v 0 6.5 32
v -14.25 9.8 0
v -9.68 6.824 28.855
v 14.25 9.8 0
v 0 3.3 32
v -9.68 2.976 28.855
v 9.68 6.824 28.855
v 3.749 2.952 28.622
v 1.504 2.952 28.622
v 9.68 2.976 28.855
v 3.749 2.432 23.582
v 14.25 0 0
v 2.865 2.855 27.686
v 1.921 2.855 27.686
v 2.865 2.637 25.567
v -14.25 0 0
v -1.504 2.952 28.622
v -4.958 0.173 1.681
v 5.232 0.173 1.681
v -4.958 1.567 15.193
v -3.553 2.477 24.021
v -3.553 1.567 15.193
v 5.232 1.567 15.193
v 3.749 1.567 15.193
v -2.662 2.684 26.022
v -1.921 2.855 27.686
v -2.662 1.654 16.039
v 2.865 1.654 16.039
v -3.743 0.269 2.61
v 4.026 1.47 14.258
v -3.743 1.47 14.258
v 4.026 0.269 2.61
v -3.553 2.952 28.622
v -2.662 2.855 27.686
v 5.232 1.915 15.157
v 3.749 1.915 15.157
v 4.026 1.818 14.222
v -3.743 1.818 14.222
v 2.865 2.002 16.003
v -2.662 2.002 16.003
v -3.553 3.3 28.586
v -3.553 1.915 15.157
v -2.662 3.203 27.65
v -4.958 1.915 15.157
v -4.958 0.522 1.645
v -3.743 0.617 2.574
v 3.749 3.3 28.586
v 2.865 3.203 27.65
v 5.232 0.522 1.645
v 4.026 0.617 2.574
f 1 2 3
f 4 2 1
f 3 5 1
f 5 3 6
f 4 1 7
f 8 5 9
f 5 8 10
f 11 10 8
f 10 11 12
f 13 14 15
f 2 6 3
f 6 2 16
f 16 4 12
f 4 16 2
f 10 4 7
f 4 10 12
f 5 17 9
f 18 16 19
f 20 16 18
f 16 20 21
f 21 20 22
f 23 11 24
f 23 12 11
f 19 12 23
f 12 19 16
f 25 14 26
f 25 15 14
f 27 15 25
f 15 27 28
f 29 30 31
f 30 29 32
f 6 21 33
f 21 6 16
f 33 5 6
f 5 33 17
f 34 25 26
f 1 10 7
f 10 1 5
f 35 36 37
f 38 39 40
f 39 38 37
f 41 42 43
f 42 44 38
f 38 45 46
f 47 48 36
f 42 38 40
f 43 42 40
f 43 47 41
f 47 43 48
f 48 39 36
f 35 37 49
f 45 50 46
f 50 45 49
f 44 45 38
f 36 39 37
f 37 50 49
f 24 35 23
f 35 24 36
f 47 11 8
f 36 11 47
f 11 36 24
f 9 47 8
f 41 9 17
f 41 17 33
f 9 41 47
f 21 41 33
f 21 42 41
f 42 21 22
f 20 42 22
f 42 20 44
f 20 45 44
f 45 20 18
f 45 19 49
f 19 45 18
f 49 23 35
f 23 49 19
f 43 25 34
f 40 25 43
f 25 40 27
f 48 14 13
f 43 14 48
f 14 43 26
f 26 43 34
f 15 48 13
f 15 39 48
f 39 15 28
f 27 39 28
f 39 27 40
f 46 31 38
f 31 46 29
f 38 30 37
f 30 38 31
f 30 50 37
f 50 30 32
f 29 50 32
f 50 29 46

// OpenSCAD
// SPDX-License-Identifier: MIT
// Copyright (c) 2026 KomaSCAD contributors. https://github.com/Kazutadashi/koma-scad
//
// KomaSCAD: a parametric shogi piece. Tested with OpenSCAD 2021.01.
// The default settings make the king of the bundled shogi set.
// Units are mm and degrees, before Model Scale, unless a comment says otherwise.
// Guides: README.md. Every setting: docs/parameters.md.
// Keep shogi_piece.json and move_diagrams.scad next to this file.

/* [01 - Start here] */
// A label for your own use. It does not change the piece.
Category = "King";
// Characters on the front, from the point to the heel.
Front_Characters = "王将";
// Characters on the back (the promoted side). Empty = blank back.
Back_Characters = "";
// An installed Japanese font. Find its exact name in Help > Font List.
Font_Name = "Yuji Syuku:style=Regular";
// Model shows the piece in its colors; press F6 for an STL. Use komascad.py export for a color 3MF.
Output_Mode = "Model"; // [Model,Blank,Inspect front,Inspect back,Inspect printability,Inspect signature,Inspect pawn circle]
// How the piece sits on the print bed. Raised text cannot touch the bed.
Print_Orientation = "Upright"; // [Upright,Front face down,Back face down]
// Multiplier for all lengths. 1 = the dimensions below.
Model_Scale = 1; // [0.25:0.05:20]

/* [02 - Piece dimensions] */
// mm. Length from the heel to the point.
Piece_Length = 32; // [15:0.1:100]
// mm. Width at the heel.
Base_Width = 28.5; // [10:0.1:100]
// mm. Thickness at the heel.
Rear_Thickness = 9.8; // [3:0.1:30]
// Tip thickness: set the thickness at the point. Reference side angles: set the slope of each face.
Taper_Mode = "Tip thickness"; // [Tip thickness,Reference side angles]
// mm. Thickness at the point, before the bevel.
Tip_Thickness = 3.2; // [1:0.1:20]

/* [03 - Front layout] */
// mm. Text size, not the measured glyph height. 0 = automatic.
Front_Font_Size = 10.4; // [0:0.1:40]
// Multiplier for the text size. 1.1 = 10% larger.
Front_Text_Scale = 1; // [0.25:0.01:2]
// mm. Distance between character centers. 0 = automatic.
Front_Character_Spacing = 10.5; // [0:0.1:40]
// Multiplier for the automatic spacing. It does not change the text size.
Front_Spacing_Scale = 1; // [0.5:0.01:2]
// Center of the text: 0 = heel, 1 = point. With Move Pitch above 0, the center of the characters only.
Front_Center_Fraction = 0.455; // [0:0.01:1]
// mm. Moves all the text. Positive = to the right.
Front_Text_X = 0; // [-20:0.1:20]
// mm. Moves all the text. Positive = toward the point.
Front_Text_Y = 0; // [-20:0.1:20]
// Multiplier for the glyph width. It does not change the spacing.
Front_Width_Scale = 1; // [0.25:0.01:2]
// Multiplier for the glyph height.
Front_Height_Scale = 1.06; // [0.25:0.01:2]
// Degrees, counterclockwise. Turns all the text around its center.
Front_Text_Rotation = 0; // [-180:1:180]

/* [04 - Back layout] */
// Use the front layout, text style, depth and stroke on the back. Back text and color stay separate.
Mirror_Front_Settings = false;
// mm. Text size, not the measured glyph height. 0 = automatic.
Back_Font_Size = 0; // [0:0.1:40]
// Multiplier for the text size. 1.1 = 10% larger.
Back_Text_Scale = 1; // [0.25:0.01:2]
// mm. Distance between character centers. 0 = automatic.
Back_Character_Spacing = 0; // [0:0.1:40]
// Multiplier for the automatic spacing. It does not change the text size.
Back_Spacing_Scale = 1; // [0.5:0.01:2]
// Center of the text: 0 = heel, 1 = point. With Move Pitch above 0, the center of the characters only.
Back_Center_Fraction = 0.42; // [0:0.01:1]
// mm. Moves all the text. Positive = to the right, seen from the back.
Back_Text_X = 0; // [-20:0.1:20]
// mm. Moves all the text. Positive = toward the point.
Back_Text_Y = 0; // [-20:0.1:20]
// Multiplier for the glyph width. It does not change the spacing.
Back_Width_Scale = 1; // [0.25:0.01:2]
// Multiplier for the glyph height.
Back_Height_Scale = 1; // [0.25:0.01:2]
// Degrees, counterclockwise. Turns all the text around its center.
Back_Text_Rotation = 0; // [-180:1:180]

/* [05 - Front character adjustments] */
// Multiplier for each character: [first, second, third], from the point. A diagram uses the entry of its slot.
Front_Glyph_Size = [1, 1, 1]; // [0.25:0.01:2]
// Multiplier for the width of each character.
Front_Glyph_Width = [1, 1.4, 1]; // [0.25:0.01:2]
// Multiplier for the height of each character.
Front_Glyph_Height = [1, 1, 1]; // [0.25:0.01:2]
// mm. Moves each character. Positive = to the right.
Front_Glyph_X = [0, 0, 0]; // [-10:0.1:10]
// mm. Moves each character. Positive = toward the point.
Front_Glyph_Y = [2, -1, 0]; // [-10:0.1:10]
// Degrees, counterclockwise. Turns each character.
Front_Glyph_Rotation = [0, 0, 0]; // [-180:1:180]

/* [06 - Back character adjustments] */
// Multiplier for each character: [first, second, third], from the point. A diagram uses the entry of its slot.
Back_Glyph_Size = [1, 1, 1]; // [0.25:0.01:2]
// Multiplier for the width of each character.
Back_Glyph_Width = [1, 1, 1]; // [0.25:0.01:2]
// Multiplier for the height of each character.
Back_Glyph_Height = [1, 1, 1]; // [0.25:0.01:2]
// mm. Moves each character. Positive = to the right, seen from the back.
Back_Glyph_X = [0, 0, 0]; // [-10:0.1:10]
// mm. Moves each character. Positive = toward the point.
Back_Glyph_Y = [1, 0, 0]; // [-10:0.1:10]
// Degrees, counterclockwise. Turns each character.
Back_Glyph_Rotation = [0, 0, 0]; // [-180:1:180]

/* [07 - Filament colors] */
// Body color. It becomes a named material in the color 3MF. Custom uses Body Color.
Body_Filament = "Wood"; // [Wood,Black,White,Red,Blue,Green,Purple,Yellow,Orange,Silver,Gold,Glitter silver,Glitter gold,Filament 1,Filament 2,Filament 3,Custom]
// Front text color.
Front_Filament = "Black"; // [Same as body,Wood,Black,White,Red,Blue,Green,Purple,Yellow,Orange,Silver,Gold,Glitter silver,Glitter gold,Filament 1,Filament 2,Filament 3,Custom]
// Back text color.
Back_Filament = "Red"; // [Same as body,Same as front,Wood,Black,White,Red,Blue,Green,Purple,Yellow,Orange,Silver,Gold,Glitter silver,Glitter gold,Filament 1,Filament 2,Filament 3,Custom]

/* [08 - Engraving and stroke weight] */
// Face only: color the groove floor. Painted grooves: floor and walls. Flush filled: fill the groove.
Text_Color_Treatment = "Flush filled"; // [Face only,Painted grooves,Flush filled]
// Recessed: cut into the face. Raised: stands up from the face. None: no text.
Front_Text_Style = "Recessed"; // [Recessed,Raised,None]
// Recessed: cut into the face. Raised: stands up from the face. None: no text.
Back_Text_Style = "Recessed"; // [Recessed,Raised,None]
// mm. Depth of recessed text, or height of raised text.
Front_Relief_Depth = 0.35; // [0:0.05:3]
// mm. Depth of recessed text, or height of raised text.
Back_Relief_Depth = 0.35; // [0:0.05:3]
// mm. Makes each stroke wider (positive) or thinner (negative). Wide strokes can close small gaps.
Front_Stroke_Expansion = 0.04; // [-0.2:0.01:0.5]
// mm. Makes each stroke wider (positive) or thinner (negative). Wide strokes can close small gaps.
Back_Stroke_Expansion = 0.04; // [-0.2:0.01:0.5]
// A different font for the front. Empty = Font Name.
Front_Font_Override = "";
// A different font for the back. Empty = Font Name.
Back_Font_Override = "";
// mm. Rounds the text edges. 0 = sharp. Rounding can remove thin strokes.
Text_Edge_Radius = 0; // [0:0.01:0.5]
// Number of layers that make a rounded text edge.
Text_Rounding_Steps = 6; // [2:1:12]

/* [09 - Edges and face margin] */
// mm. Width of the edge bevel, seen from above. 0 = no bevel.
Bevel_Width = 0; // [0:0.05:3]
// mm. Depth of the edge bevel. 0 = no bevel.
Bevel_Depth = 0; // [0:0.02:2]
// mm. Smallest distance from the text to the edge of the flat face.
Text_Margin = 0.9; // [0:0.1:4]
// Cut off text that goes past the margin. Inspect front and Inspect back show it in red.
Protect_Face_Edges = true;
// mm, after Model Scale. Smallest solid thickness at the point, between the front and back recesses.
Minimum_Web = 1.2; // [0.2:0.1:5]

/* [10 - Advanced shape angles] */
// Make the outline fit 20 pieces into a ring (base angle 81 degrees). Check it with Inspect pawn circle.
Pawn_Circle = true;
// The angle to calculate from the other two: 2 x base + 2 x shoulder + tip = 540 degrees.
Angle_Mode = "Derive shoulder"; // [Derive shoulder,Derive tip,Derive base,Check all three]
// Degrees. Outline angle at the two heel corners.
Face_Base_Angle = 81;
// Degrees. Outline angle at the two shoulders.
Face_Shoulder_Angle = 117;
// Degrees. Outline angle at the point.
Face_Tip_Angle = 144;
// Degrees. Slope of the front face at the heel. Only for Reference side angles.
Front_Side_Base_Angle = 85;
// Degrees. Slope of the back face at the heel. Only for Reference side angles.
Back_Side_Base_Angle = 81;

/* [11 - Inspection and quality] */
// [red, green, blue, opacity], 0 to 1. Used when Body Filament is Custom.
Body_Color = [0.82, 0.68, 0.43, 1];
// [red, green, blue, opacity], 0 to 1. Used when Front Filament is Custom.
Front_Inscription_Color = [0.025, 0.02, 0.015, 1];
// [red, green, blue, opacity], 0 to 1. Used when Back Filament is Custom.
Back_Inscription_Color = [0.65, 0.05, 0.04, 1];
// Show the safe area and the center line in the Inspect views.
Show_Layout_Guides = true;
// Number of segments in a curve. More is smoother and slower.
Text_Curve_Resolution = 64; // [16:8:128]
// mm, after Model Scale. The line width of your printer on the face. Inspect printability and komascad.py check use it.
Print_Line_Width = 0.5; // [0.2:0.05:1.2]

/* [12 - Maker signature on heel] */
// Put a mark on the heel (the wide bottom edge).
Signature_Enabled = false;
// The mark. It reads left to right when you look at the heel with the front face up.
Signature_Text = "";
// Font of the mark. Empty = Font Name.
Signature_Font = "";
// mm. Text size of the mark.
Signature_Font_Size = 5; // [0.5:0.1:8]
// Multiplier for the letter spacing.
Signature_Letter_Spacing = 1; // [0.5:0.05:2]
// mm. Moves the mark. Positive = to the right.
Signature_X = 0; // [-12:0.1:12]
// mm. Moves the mark. Positive = toward the front face.
Signature_Y = 0; // [-5:0.1:5]
// Degrees, counterclockwise. Turns the mark.
Signature_Rotation = 0; // [-180:1:180]
// mm. Depth of the mark into the heel.
Signature_Depth = 0.2; // [0:0.05:2]
// mm. Smallest distance from the mark to the heel edges.
Signature_Margin = 0.6; // [0.1:0.1:3]
// Color of the mark.
Signature_Filament = "Same as front"; // [Same as body,Same as front,Wood,Black,White,Red,Blue,Green,Purple,Yellow,Orange,Silver,Gold,Glitter silver,Glitter gold,Filament 1,Filament 2,Filament 3,Custom]
// [red, green, blue, opacity], 0 to 1. Used when Signature Filament is Custom.
Signature_Color = [0.025, 0.02, 0.015, 1];

/* [13 - Movement diagrams] */
// Movement grid, rows from point to heel, / between rows. See docs/move-diagrams.md. Empty = none.
Front_Moves = "";
// Put the diagram below or above the characters.
Front_Move_Position = "Below"; // [Below,Above]
// Movement grid for the back, after promotion. Empty = no diagram.
Back_Moves = "";
// Put the diagram below or above the characters.
Back_Move_Position = "Below"; // [Below,Above]
// mm, after Model Scale. Thinnest diagram line.
Move_Stroke = 0.6; // [0.3:0.05:2]
// mm, after Model Scale. Smallest space between diagram marks.
Move_Gap = 0.6; // [0.3:0.05:2]
// mm, after Model Scale. Distance between squares. 0 = automatic. Use one value for all pieces of a set.
Move_Pitch = 0; // [0:0.05:10]

/* [Hidden] */
// komascad.py sets this to read the materials and fonts without making geometry.
Export_Metadata = false;

// General helpers.
function in_list(x, list) = len([for (y = list) if (x == y) 1]) > 0;
function sum(v, n) = n <= 0 ? 0 : v[n-1] + sum(v, n-1);
function unit(v) = v/norm(v);
function inward(v) = [-v[1], v[0]];

version = "3.5";   // the same as VERSION in komascad.py; a test checks this
$fn = Text_Curve_Resolution;
epsilon = 0.02;   // overlap that keeps boolean operations clean


// ===== 1. Face settings ======================================================
// f is true for the front and false for the back.

function chars(f) = f ? Front_Characters : Back_Characters;
function move_grid(f) = f ? Front_Moves : Back_Moves;
function has_moves(f) = len(move_grid(f)) > 0;
function moves_above(f) = has_moves(f) && (f ? Front_Move_Position : Back_Move_Position) == "Above";

// Settings that the back takes from the front when Mirror Front Settings is on.
function pick(f, front, back) = f || Mirror_Front_Settings ? front : back;
function style(f)             = pick(f, Front_Text_Style, Back_Text_Style);
function depth(f)             = pick(f, Front_Relief_Depth, Back_Relief_Depth);
function stroke_expansion(f)  = pick(f, Front_Stroke_Expansion, Back_Stroke_Expansion);
function font_override(f)     = pick(f, Front_Font_Override, Back_Font_Override);
function font(f)              = font_override(f) == "" ? Font_Name : font_override(f);
function font_size_setting(f) = pick(f, Front_Font_Size, Back_Font_Size);
function text_scale(f)        = pick(f, Front_Text_Scale, Back_Text_Scale);
function spacing_setting(f)   = pick(f, Front_Character_Spacing, Back_Character_Spacing);
function spacing_scale(f)     = pick(f, Front_Spacing_Scale, Back_Spacing_Scale);
function center_fraction(f)   = pick(f, Front_Center_Fraction, Back_Center_Fraction);
function text_x(f)            = pick(f, Front_Text_X, Back_Text_X);
function text_y(f)            = pick(f, Front_Text_Y, Back_Text_Y);
function text_rotation(f)     = pick(f, Front_Text_Rotation, Back_Text_Rotation);

// Per-character lists. Entries after the third are neutral.
function entry(list, i, neutral) = i < len(list) ? list[i] : neutral;
function glyph_size(f, i)     = entry(pick(f, Front_Glyph_Size, Back_Glyph_Size), i, 1);
function glyph_width(f, i)    = entry(pick(f, Front_Glyph_Width, Back_Glyph_Width), i, 1)
                                * pick(f, Front_Width_Scale, Back_Width_Scale);
function glyph_height(f, i)   = entry(pick(f, Front_Glyph_Height, Back_Glyph_Height), i, 1)
                                * pick(f, Front_Height_Scale, Back_Height_Scale);
function glyph_x(f, i)        = entry(pick(f, Front_Glyph_X, Back_Glyph_X), i, 0);
function glyph_y(f, i)        = entry(pick(f, Front_Glyph_Y, Back_Glyph_Y), i, 0);
function glyph_rotation(f, i) = entry(pick(f, Front_Glyph_Rotation, Back_Glyph_Rotation), i, 0);

// A face holds its characters, plus one slot for the diagram above or below them.
function slots(f) = len(chars(f)) + (has_moves(f) ? 1 : 0);
function diagram_slot(f) = !has_moves(f) ? -1 : moves_above(f) ? 0 : slots(f) - 1;
function active(f) = slots(f) > 0 && style(f) != "None" && depth(f) > 0;
function recessed(f) = active(f) && style(f) == "Recessed";

// Each printed part has a role. The color 3MF has one part for each role.
body_role = 0;
front_role = 1;
back_role = 2;
signature_role = 3;
function face_role(f) = f ? front_role : back_role;

filament_palette = [
    ["Wood", [0.76, 0.58, 0.34, 1]],   ["Black", [0.08, 0.06, 0.04, 1]],
    ["White", [0.95, 0.95, 0.95, 1]],  ["Red", [0.65, 0.05, 0.04, 1]],
    ["Blue", [0.08, 0.25, 0.8, 1]],    ["Green", [0.08, 0.5, 0.2, 1]],
    ["Purple", [0.45, 0.15, 0.65, 1]], ["Yellow", [0.95, 0.8, 0.08, 1]],
    ["Orange", [0.95, 0.35, 0.05, 1]], ["Silver", [0.7, 0.72, 0.75, 1]],
    ["Gold", [0.8, 0.62, 0.2, 1]],     ["Glitter silver", [0.7, 0.72, 0.75, 1]],
    ["Glitter gold", [0.8, 0.62, 0.2, 1]],
    ["Filament 1", [0.5, 0.5, 0.5, 1]], ["Filament 2", [0.15, 0.5, 0.85, 1]], ["Filament 3", [0.85, 0.25, 0.5, 1]]
];
role_names = ["body", "front", "back", "signature"];
function filament(role) = [Body_Filament, Front_Filament, Back_Filament, Signature_Filament][role];
// The role whose filament this role uses: "Same as body" and "Same as front" point to another role.
function material_source(role) =
      filament(role) == "Same as body" ? body_role
    : filament(role) == "Same as front" ? material_source(front_role)
    : role;
function material_name(role) =
    let(src = material_source(role))
    filament(src) == "Custom" ? str("Custom ", role_names[src]) : filament(src);
function material_rgb(role) =
    let(src = material_source(role), name = filament(src), found = [for (p = filament_palette) if (p[0] == name) p[1]])
    name == "Custom" ? [Body_Color, Front_Inscription_Color, Back_Inscription_Color, Signature_Color][src]
    : assert(len(found) == 1, str("Unknown filament: ", name)) found[0];


// ===== 2. Piece body ==========================================================
// Plan view: x across the piece, y from the heel (y = 0) to the point.
// z is the thickness: the back face is near z = 0, the front face on top.

// The outline angles. Angle Mode selects the one that follows from the other two.
base_angle = Angle_Mode == "Derive base"
    ? (Pawn_Circle ? 81 : (540 - 2*Face_Shoulder_Angle - Face_Tip_Angle)/2)
    : Face_Base_Angle;
shoulder_angle = Angle_Mode == "Derive shoulder" ? (540 - 2*Face_Base_Angle - Face_Tip_Angle)/2 : Face_Shoulder_Angle;
tip_angle = Angle_Mode == "Derive tip" ? 540 - 2*Face_Base_Angle - 2*Face_Shoulder_Angle : Face_Tip_Angle;

// Each face drops this far in z for each mm toward the point.
front_slope = Taper_Mode == "Tip thickness"
    ? (Rear_Thickness - Tip_Thickness)/(2*Piece_Length)
    : 1/tan(Front_Side_Base_Angle);
back_slope = Taper_Mode == "Tip thickness" ? front_slope : 1/tan(Back_Side_Base_Angle);
tip_thickness = Rear_Thickness - Piece_Length*(front_slope + back_slope);

shoulder_y = (Piece_Length - Base_Width/2*tan((180 - tip_angle)/2))
             / (1 - tan(90 - base_angle)*tan((180 - tip_angle)/2));
shoulder_x = Base_Width/2 - shoulder_y*tan(90 - base_angle);
outline = [[-Base_Width/2, 0], [Base_Width/2, 0], [shoulder_x, shoulder_y],
           [0, Piece_Length], [-shoulder_x, shoulder_y]];

// Corner i of the outline, moved inward by distance from both of its edges.
function inset_point(i, distance) =
    let(p = outline[i], before = inward(unit(p - outline[(i+4)%5])), after = inward(unit(outline[(i+1)%5] - p)))
    p + distance*(before + after)/(1 + before*after);

has_bevel = Bevel_Width > 0 && Bevel_Depth > 0;
bevel_outline = [for (i = [0:4]) inset_point(i, Bevel_Width)];
flat_outline = has_bevel ? bevel_outline : outline;   // the flat face, inside the bevel
safe_inset = (has_bevel ? Bevel_Width : 0) + Text_Margin;
safe_outline = [for (i = [0:4]) inset_point(i, safe_inset)];   // the text stays inside this

function back_face_z(p) = p[1]*back_slope;
function front_face_z(p) = Rear_Thickness - p[1]*front_slope;

// The body is a stack of 5-point rings from the back face to the front face.
// Every point of a face comes from one plane equation, so each face stays flat.
body_rings = has_bevel
    ? [[for (p = bevel_outline) [p[0], p[1], back_face_z(p)]],
       [for (p = outline) [p[0], p[1], back_face_z(p) + Bevel_Depth]],
       [for (p = outline) [p[0], p[1], front_face_z(p) - Bevel_Depth]],
       [for (p = bevel_outline) [p[0], p[1], front_face_z(p)]]]
    : [[for (p = outline) [p[0], p[1], back_face_z(p)]],
       [for (p = outline) [p[0], p[1], front_face_z(p)]]];
body_points = [for (ring = body_rings, p = ring) p];
last_ring = len(body_rings) - 1;
// The faces: the back face, then the sides ring by ring, then the front face.
body_faces = concat(
    [[4, 3, 2, 1, 0]],
    [for (r = [0:last_ring-1], i = [0:4]) [5*r + i, 5*r + (i+1)%5, 5*(r+1) + (i+1)%5, 5*(r+1) + i]],
    [[for (i = [0:4]) 5*last_ring + i]]);
back_face_index = 0;
front_face_index = len(body_faces) - 1;
heel_face_index = 1 + (has_bevel ? 5 : 0);   // the side between corners 0 and 1

// Triangulate in a fixed way, so that CGAL output is the same every time.
function triangles(face) = [for (k = [1:len(face)-2]) [face[0], face[k], face[k+1]]];
module body_shell(omit=[]) {
    polyhedron(points=body_points, convexity=10,
        faces=[for (i = [0:len(body_faces)-1], t = triangles(body_faces[i]))
                   if (!in_list(i, omit)) [t[2], t[1], t[0]]]);
}
module blank() { body_shell(); }


// ===== 3. Text layout =========================================================
// Text is drawn flat in face coordinates: x across, y along the face from the
// heel, z out of the face. on_face() puts it on the sloped face.

// Automatic text size: the characters fill auto_fill of the face length, at
// auto_slot_sizes text sizes per slot, and are never wider than max_width_share
// of the heel. Each character slot is spacing_sizes text sizes long.
auto_fill = 0.72;
auto_slot_sizes = 1.35;
max_width_share = 0.43;
spacing_sizes = 1.42;
// With a diagram, the characters and the diagram fill this share of the safe face length.
move_fill = 0.9;
// Without Move Pitch, a diagram grows up to this many text sizes.
diagram_growth = 1.2;

function slope(f) = f ? front_slope : back_slope;
function cosine(f) = 1/sqrt(1 + slope(f)*slope(f));
function face_length(f) = Piece_Length/cosine(f);
function face_polygon(points, f) = [for (p = points) [p[0], p[1]/cosine(f)]];
function safe_ys(f) = [for (p = safe_outline) p[1]/cosine(f)];
function safe_length(f) = max(safe_ys(f)) - min(safe_ys(f));

// With a diagram, the characters get the face length that the smallest
// printable diagram leaves. The space above the diagram is (spacing_sizes - 1) sizes.
function auto_font_size(f) =
    let(n = len(chars(f)))
    has_moves(f) && n > 0
    ? (safe_length(f)*move_fill - min_diagram_size(f)[1]) / (spacing_sizes*spacing_scale(f)*n + spacing_sizes - 1)
    : face_length(f)*auto_fill/(auto_slot_sizes*max(1, slots(f)));
function font_size(f) =
    text_scale(f) * (font_size_setting(f) > 0 ? font_size_setting(f)
                     : min(Base_Width*max_width_share, auto_font_size(f)));
function char_spacing(f) =
    spacing_setting(f) > 0 ? spacing_setting(f) : font_size(f)*spacing_sizes*spacing_scale(f);

// Slots stack from the point to the heel. A character slot is one character
// spacing long. A diagram slot is the diagram plus the space above a character.
function slot_height(f, i) =
    i == diagram_slot(f) ? diagram_size(f)[1] + char_spacing(f) - font_size(f) : char_spacing(f);
function slot_heights(f) = [for (i = [0:slots(f)-1]) slot_height(f, i)];
function stack_height(f) = sum(slot_heights(f), slots(f));
// The center of slot i, from the center of the stack.
function slot_y(f, i) = stack_height(f)/2 - sum(slot_heights(f), i) - slot_heights(f)[i]/2;

// The center of the stack on the face.
function center_y(f) =
    let(c = face_length(f)*center_fraction(f) + text_y(f), n = len(chars(f)))
    !has_moves(f) ? c
    // With a fixed Move Pitch (a set), Center Fraction places the characters, and
    // the diagram goes beside them. The characters then line up on every piece.
    : Move_Pitch > 0 && n > 0 ? c - sum([for (i = [0:slots(f)-1]) if (i != diagram_slot(f)) slot_y(f, i)], n)/n
    // Otherwise keep the stack inside the face. The fit check stops a stack that is too long.
    : let(half = stack_height(f)/2) max(min(safe_ys(f)) + half, min(max(safe_ys(f)) - half, c));

// Face coordinates to model coordinates. The back is turned over, so that its text reads correctly.
module on_face(f) {
    s = f ? 1 : -1;
    c = cosine(f);
    multmatrix([[s, 0, 0, 0],
                [0, c, slope(f)*c, 0],
                [0, -s*slope(f)*c, s*c, f ? Rear_Thickness : 0],
                [0, 0, 0, 1]]) children();
}
module safe_face(f) { polygon(face_polygon(safe_outline, f)); }
module flat_face(f) { polygon(face_polygon(flat_outline, f)); }

// The characters and the diagram, before Protect Face Edges.
module raw_inscription(f, diagram=true) {
    if (slots(f) > 0 && style(f) != "None")
    translate([text_x(f), center_y(f)]) rotate(text_rotation(f))
    for (i = [0:slots(f)-1])
        translate([glyph_x(f, i), slot_y(f, i) + glyph_y(f, i)]) rotate(glyph_rotation(f, i))
        if (i == diagram_slot(f)) { if (diagram) move_diagram(f); }
        // Stroke expansion is for lettering only. Expand after scaling, so that it stays a true mm value.
        else offset(delta=stroke_expansion(f)) scale(glyph_size(f, i)*[glyph_width(f, i), glyph_height(f, i)])
            text(chars(f)[moves_above(f) ? i-1 : i], size=font_size(f), font=font(f),
                 halign="center", valign="center", language="ja");
}
module inscription(f) {
    if (Protect_Face_Edges) intersection() { raw_inscription(f); safe_face(f); }
    else raw_inscription(f);
}


// ===== 4. Movement diagrams ===================================================
// move_diagrams.scad reads the grids and lays out the marks. This section sizes
// the diagram of each face.

mv_w = Move_Stroke/Model_Scale;   // the thinnest line
mv_g = Move_Gap/Model_Scale;      // the smallest space between marks
mv_min_head = 2.4/Model_Scale;    // a slicer turns a shorter arrowhead into a dot
include <move_diagrams.scad>

// OpenSCAD does not cache function results, and the solver is slow. Thus each
// face's diagram is solved once here, and the functions below read the result.
front_moves = has_moves(true) ? mv_grid_moves("Front_Moves", Front_Moves) : [];
back_moves = has_moves(false) ? mv_grid_moves("Back_Moves", Back_Moves) : [];
// The smallest printable diagram. It sets how much the automatic text size shrinks.
front_min_pitch = has_moves(true) ? mv_solve(front_moves, mv_w) : 0;
back_min_pitch = has_moves(false) ? mv_solve(back_moves, mv_w) : 0;
front_min_size = has_moves(true) ? mv_size(mv_box(front_moves, front_min_pitch)) : [0, 0];
back_min_size = has_moves(false) ? mv_size(mv_box(back_moves, back_min_pitch)) : [0, 0];
function moves(f) = f ? front_moves : back_moves;
function min_pitch(f) = f ? front_min_pitch : back_min_pitch;
function min_diagram_size(f) = f ? front_min_size : back_min_size;

// The drawn pitch. A larger pitch only makes the gaps wider, so it stays
// printable. Without Move Pitch, the diagram grows to about one character, but
// only into face length that the characters leave free. A Glyph Size above 1
// for the diagram slot makes it larger.
function drawn_pitch(f) =
    Move_Pitch > 0 ? Move_Pitch/Model_Scale :
    let(size = min_diagram_size(f),
        letters = len(chars(f))*char_spacing(f) + char_spacing(f) - font_size(f),
        room = (safe_length(f)*move_fill - letters)/size[1])
    min_pitch(f) * max(1, min(diagram_growth*font_size(f)/max(size), room)) * max(1, glyph_size(f, diagram_slot(f)));
front_pitch = has_moves(true) ? drawn_pitch(true) : 0;
back_pitch = has_moves(false) ? drawn_pitch(false) : 0;
front_box = has_moves(true) ? mv_box(front_moves, front_pitch) : [[0, 0], [0, 0]];
back_box = has_moves(false) ? mv_box(back_moves, back_pitch) : [[0, 0], [0, 0]];
function pitch(f) = f ? front_pitch : back_pitch;
function diagram_box(f) = f ? front_box : back_box;
function diagram_size(f) = mv_size(diagram_box(f));

module move_diagram(f) { mv_draw(moves(f), pitch(f), diagram_box(f)); }


// ===== 5. The printed piece ===================================================

// A rounded text edge is built from thin layers; this is the outline of one layer.
module rounded_outline(f, r, expansion) {
    if (expansion > 0) offset(r=expansion) offset(delta=-r) inscription(f);
    else offset(delta=-r) inscription(f);
}
function text_radius(f) = min(Text_Edge_Radius, depth(f)/2);

// The text as a 3D cutter (Recessed) or solid (Raised), on its face.
module relief(f) {
    d = depth(f);
    raised = style(f) == "Raised";
    r = text_radius(f);
    zmin = raised ? -epsilon : -d;
    zmax = raised ? d : epsilon;
    if (active(f)) on_face(f) {
        if (r == 0) translate([0, 0, zmin]) linear_extrude(zmax - zmin, convexity=20) inscription(f);
        else {
            // A straight part, then thin layers that step in to make the rounded edge.
            translate([0, 0, raised ? zmin : zmin + r])
                linear_extrude(zmax - zmin - r, convexity=20) rounded_outline(f, r, r);
            h = r/Text_Rounding_Steps;
            overlap = min(epsilon, h/10);
            for (i = [0:Text_Rounding_Steps-1]) {
                t = (i + 0.5)/Text_Rounding_Steps;
                z = raised ? zmax - r + i*h : zmin + r - (i+1)*h;
                translate([0, 0, raised ? z - overlap : z])
                    linear_extrude(h + overlap, convexity=20) rounded_outline(f, r, r*sqrt(1 - t*t));
            }
        }
    }
}

// The maker's signature on the heel. Heel coordinates: x = model x, y = model z.
function signature_active() = Signature_Enabled && len(Signature_Text) > 0 && Signature_Depth > 0;
function signature_font() = Signature_Font == "" ? Font_Name : Signature_Font;
heel_rim = has_bevel ? Bevel_Depth : 0;
sig_half_width = Base_Width/2 - Signature_Depth*tan(90 - base_angle) - Signature_Margin;
sig_low = max(heel_rim, Signature_Depth*back_slope) + Signature_Margin - Rear_Thickness/2;
sig_high = min(Rear_Thickness - heel_rim, Rear_Thickness - Signature_Depth*front_slope)
           - Signature_Margin - Rear_Thickness/2;
module on_heel() { multmatrix([[1, 0, 0, 0], [0, 0, -1, 0], [0, 1, 0, Rear_Thickness/2], [0, 0, 0, 1]]) children(); }
module signature_safe() { translate([-sig_half_width, sig_low]) square([2*sig_half_width, sig_high - sig_low]); }
module signature_raw() {
    translate([Signature_X, Signature_Y]) rotate(Signature_Rotation)
    text(Signature_Text, size=Signature_Font_Size, font=signature_font(), spacing=Signature_Letter_Spacing,
         halign="center", valign="center");
}
module signature_outline() { intersection() { signature_raw(); signature_safe(); } }
module signature_cutter() {
    if (signature_active()) on_heel() translate([0, 0, -Signature_Depth])
        linear_extrude(Signature_Depth + epsilon, convexity=20) signature_outline();
}

// The exact piece in one material, for F6 and STL export.
module piece() {
    difference() {
        union() { blank(); for (f = [true, false]) if (style(f) == "Raised") relief(f); }
        for (f = [true, false]) if (style(f) == "Recessed") relief(f);
        signature_cutter();
    }
}


// ===== 6. Color parts for the 3MF exporter ====================================
// komascad.py renders each part with Output_Mode "Color body", "Color front",
// "Color back" or "Color signature", and puts them together in one 3MF.
// The parts touch, but do not overlap.
//
// A color part is a color volume behind the visible text surface, cut to the
// piece. The body is the piece minus all color volumes. Where two color
// volumes meet, the signature wins over the front, and the front over the back.

color_backing = 0.8;   // mm of color behind the visible surface; a 0.4 mm nozzle cannot print less
paint_wall = 0.35;     // Painted grooves: width of color beside the groove wall
paint_lip = 0.03;      // Painted grooves: body color at the top of the groove wall

color_roles = [front_role, back_role, signature_role];
function role_active(role) = role == signature_role ? signature_active() : active(role == front_role);
function role_depth(role) = role == signature_role ? Signature_Depth : depth(role == front_role);
function role_raised(role) = role != signature_role && style(role == front_role) == "Raised";
// The bottom of the color volume, and the visible text surface.
function color_floor(role) = role_raised(role) ? -color_backing : -role_depth(role) - color_backing;
function text_surface(role) = role_raised(role) ? role_depth(role) : -role_depth(role);
module role_outline(role) { if (role == signature_role) signature_outline(); else inscription(role == front_role); }
module on_role(role) { if (role == signature_role) on_heel() children(); else on_face(role == front_role) children(); }
// The outline of a role, extruded from z = bottom to z = top (z = 0 on the surface, negative inside).
module role_slab(role, bottom, top, grow=0) {
    on_role(role) translate([0, 0, bottom])
        linear_extrude(top - bottom, convexity=20) offset(delta=grow) role_outline(role);
}

// Face only can use its color volumes as they are, without the slow cut to the
// piece: with sharp text edges and wide margins, they lie fully inside the body.
face_only_fast = Text_Color_Treatment == "Face only" && Text_Edge_Radius == 0
    && Text_Margin > color_backing*max(front_slope, back_slope) + epsilon
    && (!signature_active()
        || Signature_Margin > color_backing*max(tan(90 - base_angle), front_slope, back_slope) + epsilon);

module color_volume(role) {
    treatment = Text_Color_Treatment;
    if (role_active(role)) {
        // A level inlay from the backing up through the face.
        if (treatment == "Flush filled") role_slab(role, -color_backing, epsilon);
        // Face only: the backing under the groove floor, or raised text and its backing.
        else if (treatment == "Face only") role_slab(role, color_floor(role), text_surface(role));
        // Painted grooves: also the groove walls, up to just under the face.
        else if (treatment == "Painted grooves" && !role_raised(role))
            role_slab(role, color_floor(role), -paint_lip, paint_wall);
        // Painted grooves, raised text: slightly larger than the text, so that the cut to the piece is clean.
        else role_slab(role, color_floor(role), text_surface(role) + epsilon, epsilon/2);
    }
}
// The solid that the color volumes are cut from. A flush inlay fills the groove.
module color_solid() { if (Text_Color_Treatment == "Flush filled") blank(); else piece(); }

module color_part(role) {
    difference() {
        if (face_only_fast) color_volume(role);
        else intersection() { color_solid(); color_volume(role); }
        if (role == back_role) color_volume(front_role);
        if (role != signature_role) color_volume(signature_role);
    }
}
module body_part() {
    // Fast: cut the groove and the color volume out of the plain body in one
    // step. Raised text belongs to its color part, so the body does not get it.
    if (face_only_fast) difference() {
        blank();
        for (role = color_roles) if (role_active(role)) role_slab(role, color_floor(role), epsilon);
    }
    else difference() { color_solid(); for (role = color_roles) color_volume(role); }
}


// ===== 7. Fast preview (F5) ===================================================
// On some graphics drivers, OpenSCAD 2021 shows an empty view after it
// subtracts text in F5. F5 Model therefore draws an open shell: the body
// without its text faces, each face as a thin skin with the text cut out in 2D,
// and the groove walls and floors at their true depth. F6 and the exporter use
// the exact geometry above.

module opening(f) { if (text_radius(f) == 0) inscription(f); else rounded_outline(f, text_radius(f), text_radius(f)); }
module floor_outline(f) { if (text_radius(f) == 0) inscription(f); else rounded_outline(f, text_radius(f), 0); }
// Groove walls: dark on a light body, light on a dark body, mixed with the body
// color. Light or dark is the perceived brightness (Rec. 601 weights).
function preview_wall_rgb() =
    let(body = material_rgb(body_role), mark = 0.299*body[0] + 0.587*body[1] + 0.114*body[2] > 0.45 ? 0.035 : 0.88)
    [for (i = [0:2]) (2*body[i] + mark)/3, 1];
// A thin outline of a 2D shape.
module rim(width) { difference() { offset(delta=width/2) children(); offset(delta=-width/2) children(); } }

module print_preview() {
    painted = Text_Color_Treatment == "Painted grooves";
    flush = Text_Color_Treatment == "Flush filled";
    color(material_rgb(body_role)) {
        body_shell(omit=concat(recessed(false) ? [back_face_index] : [],
                               recessed(true) ? [front_face_index] : [],
                               signature_active() ? [heel_face_index] : []));
        for (f = [true, false]) if (recessed(f))
            on_face(f) translate([0, 0, -epsilon/2]) linear_extrude(epsilon/2, convexity=20)
                difference() { flat_face(f); opening(f); }
        if (signature_active())
            on_heel() translate([0, 0, -epsilon/2]) linear_extrude(epsilon/2, convexity=20) difference() {
                translate([-Base_Width/2, -Rear_Thickness/2 + heel_rim])
                    square([Base_Width, Rear_Thickness - 2*heel_rim]);
                signature_outline();
            }
    }
    // The groove walls.
    if (!flush) {
        for (f = [true, false]) if (recessed(f))
            color(painted ? material_rgb(face_role(f)) : preview_wall_rgb())
            on_face(f) translate([0, 0, -depth(f)]) linear_extrude(depth(f), convexity=20) rim(epsilon) opening(f);
        if (signature_active())
            color(painted ? material_rgb(signature_role) : preview_wall_rgb())
            on_heel() translate([0, 0, -Signature_Depth]) linear_extrude(Signature_Depth, convexity=20)
                rim(epsilon) signature_outline();
    }
    // The colored surfaces.
    grow = painted ? paint_wall : 0;
    for (f = [true, false]) if (active(f)) color(material_rgb(face_role(f))) {
        if (style(f) == "Raised") relief(f);
        else if (flush) on_face(f) linear_extrude(epsilon/2, convexity=20) opening(f);
        else on_face(f) translate([0, 0, -depth(f)]) linear_extrude(epsilon/2, convexity=20)
            offset(delta=grow) floor_outline(f);
    }
    if (signature_active())
        color(material_rgb(signature_role)) on_heel() translate([0, 0, flush ? 0 : -Signature_Depth])
        linear_extrude(epsilon/2, convexity=20) offset(delta=grow) signature_outline();
}


// ===== 8. Inspection views (F5 only) ==========================================

guide_rgb = [0.1, 0.5, 0.9, 0.65];
module guide_line(width=0.08) { difference() { children(); offset(delta=-width) children(); } }
module preview_only() { assert($preview, "Inspect views are F5 only. Select Model or Blank to export an STL."); }

// One face, flat: the text in its color, overflow in red, the safe area in blue.
module inspect_face(f) {
    preview_only();
    color(material_rgb(body_role)) linear_extrude(0.1) polygon(face_polygon(outline, f));
    if (active(f)) {
        color(material_rgb(face_role(f))) translate([0, 0, 0.12]) linear_extrude(0.02)
            intersection() { raw_inscription(f); safe_face(f); }
        color([1, 0, 0, 1]) translate([0, 0, 0.15]) linear_extrude(0.02)
            difference() { raw_inscription(f); safe_face(f); }
    }
    if (Show_Layout_Guides) {
        color(guide_rgb) translate([0, 0, 0.11]) linear_extrude(0.005) guide_line() safe_face(f);
        color(guide_rgb) translate([-0.025, 0, 0.11]) cube([0.05, face_length(f), 0.005]);
        // One printed line at final size, beside the piece.
        color([0.1, 0.5, 0.9, 1]) translate([Base_Width/2 + 2, 2, 0])
            cube([Print_Line_Width/Model_Scale, 5/Model_Scale, 0.1]);
    }
}

module inspect_signature() {
    preview_only();
    color(material_rgb(body_role)) linear_extrude(0.1) square([Base_Width, Rear_Thickness], center=true);
    if (signature_active()) {
        color(material_rgb(signature_role)) translate([0, 0, 0.12]) linear_extrude(0.02) signature_outline();
        color([1, 0, 0, 1]) translate([0, 0, 0.15]) linear_extrude(0.02)
            difference() { signature_raw(); signature_safe(); }
    }
    if (Show_Layout_Guides)
        color(guide_rgb) translate([0, 0, 0.11]) linear_extrude(0.005) guide_line() signature_safe();
}

// Twenty outlines in a ring, in plan view, without text, taper or bevel.
pawn_circle_apothem = Base_Width/(2*tan(9));
module inspect_pawn_circle() {
    preview_only();
    assert(Pawn_Circle, "Turn on Pawn Circle first.");
    for (i = [0:19]) rotate(i*18) translate([0, -pawn_circle_apothem]) {
        color(i%2 == 0 ? material_rgb(body_role) : [0.64, 0.43, 0.22, 1]) linear_extrude(0.1) polygon(outline);
        if (Show_Layout_Guides)
            color([0.1, 0.5, 0.9, 1]) translate([0, 0, 0.11]) linear_extrude(0.005) guide_line() polygon(outline);
    }
    if (Show_Layout_Guides) color(guide_rgb) translate([0, 0, 0.11]) linear_extrude(0.005)
        rim(0.08) circle(r=Base_Width/(2*sin(9)), $fn=360);
}

// Printability. A stroke thinner than one printed line disappears under an
// opening (shrink by half a line, then grow back). A gap narrower than one line
// fills under a closing (grow, then shrink back). komascad.py check measures
// the area of each as a share of the lettering. Characters only: diagrams are
// made of lines and gaps of at least one printed line.
print_line = Print_Line_Width/Model_Scale;
module letters(f) { intersection() { raw_inscription(f, diagram=false); safe_face(f); } }
module thin_strokes(f) {
    difference() { letters(f); offset(r=print_line/2) offset(r=-print_line/2) letters(f); }
}
module narrow_gaps(f) {
    difference() { offset(r=-print_line/2) offset(r=print_line/2) letters(f); letters(f); }
}
module inspect_printability() {
    preview_only();
    for (f = [true, false]) if (active(f)) translate([(f ? -0.6 : 0.6)*Base_Width, 0, 0]) {
        color(material_rgb(body_role)) linear_extrude(0.1) flat_face(f);
        color(material_rgb(face_role(f))) translate([0, 0, 0.12]) linear_extrude(0.02) inscription(f);
        color([1, 0.85, 0, 1]) translate([0, 0, 0.16]) linear_extrude(0.02) thin_strokes(f);
        color([0.1, 0.6, 1, 1]) translate([0, 0, 0.16]) linear_extrude(0.02) narrow_gaps(f);
    }
    echo(str("Inspect printability: front left, back right. Yellow: strokes thinner than Print Line Width.",
             " Blue: gaps narrower than it."));
}
// komascad.py check exports these as 2D SVG, with Output_Mode "Printability <front|back> <ink|thin|gaps>".
module printability_layer(f, layer) {
    if (active(f) && len(chars(f)) > 0) {
        if (layer == "ink") letters(f);
        if (layer == "thin") thin_strokes(f);
        if (layer == "gaps") narrow_gaps(f);
    }
}


// ===== 9. Checks ==============================================================
// Stop with a message when the settings cannot make a piece.

assert(abs(2*base_angle + 2*shoulder_angle + tip_angle - 540) < 0.001,
    "The outline angles do not close. Choose a Derive mode, or correct the angles.");
assert(base_angle > 45 && base_angle < 90 && shoulder_angle > 90 && shoulder_angle < 180
       && tip_angle > 60 && tip_angle < 180,
    "The outline angles are outside the supported range.");
if (Pawn_Circle) {
    assert(abs(base_angle - 81) < 1e-6,
        str("Pawn Circle needs a base angle of 81 degrees; it is ", base_angle, ". Set it to 81, or use Derive base."));
    assert(Piece_Length < pawn_circle_apothem,
        str("Pawn Circle: the length must be less than ", pawn_circle_apothem, " mm at this width."));
}
if (Taper_Mode == "Tip thickness")
    assert(Tip_Thickness <= Rear_Thickness, "The tip cannot be thicker than the heel.");
else
    assert(Front_Side_Base_Angle > 60 && Front_Side_Base_Angle <= 90
           && Back_Side_Base_Angle > 60 && Back_Side_Base_Angle <= 90,
        "Side angles must be more than 60 and not more than 90 degrees.");
assert(shoulder_x > 0 && shoulder_y > 0 && shoulder_y < Piece_Length,
    "These dimensions and angles do not make a convex piece.");
assert(tip_thickness > 0, "The taper makes the point vanish. Increase the thickness, or reduce the taper.");
assert(Bevel_Width < min(Base_Width, Piece_Length)/8, "Bevel Width is too large.");
for (p = safe_outline, i = [0:4])
    assert((p - outline[i])*inward(unit(outline[(i+1)%5] - outline[i])) >= safe_inset - 0.0001
           && safe_outline[1][0] > safe_outline[0][0] && safe_outline[3][1] > safe_outline[2][1],
        "Text Margin leaves no face. Reduce the margin or the bevel, or make the piece larger.");
// The solid material at the point: the tip, less both bevels and both recesses.
function recess_z(f) = recessed(f) && Output_Mode != "Blank" ? depth(f)*sqrt(1 + pow(slope(f), 2)) : 0;
assert((tip_thickness - (has_bevel ? 2*Bevel_Depth : 0) - recess_z(true) - recess_z(false))*Model_Scale >= Minimum_Web,
    "Too little solid material at the point. Increase Tip Thickness, or reduce the recess depth or the bevel.");
for (f = [true, false])
    assert(!(style(f) == "Raised" && active(f) && Print_Orientation == (f ? "Front face down" : "Back face down")),
        str(f ? "Raised front" : "Raised back", " text would go into the bed. Choose another Print Orientation."));
if (Text_Color_Treatment == "Flush filled")
    for (f = [true, false]) assert(!active(f) || style(f) == "Recessed",
        "Flush filled needs Recessed text. Choose Face only or Painted grooves for Raised text.");
assert(Move_Stroke >= Print_Line_Width && Move_Gap >= Print_Line_Width,
    "Move Stroke and Move Gap cannot be less than Print Line Width.");
if (signature_active())
    assert(Signature_Depth < Piece_Length/4 && sig_half_width > 0 && sig_high > sig_low,
        "The signature margin and depth leave no space on the heel.");

// True when point q is inside or on the convex polygon poly.
function inside_convex(q, poly) =
    let(n = len(poly), sides = [for (i = [0:n-1]) let(a = poly[i], b = poly[(i+1)%n])
            (b[0] - a[0])*(q[1] - a[1]) - (b[1] - a[1])*(q[0] - a[0])])
    min(sides) >= -1e-6 || max(sides) <= 1e-6;

// A diagram never shrinks below printable, so a face that cannot hold it and
// its characters stops here. Inspect printability checks the characters.
for (f = [true, false]) if (has_moves(f) && active(f)) {
    name = f ? "Front" : "Back";
    ys = safe_ys(f);
    need = stack_height(f);
    assert(Move_Pitch == 0 || Move_Pitch/Model_Scale >= min_pitch(f) - 1e-6,
        str(name, " Moves need at least ", min_pitch(f)*Model_Scale, " mm between squares; Move Pitch is ",
            Move_Pitch, " mm."));
    assert(center_y(f) - need/2 >= min(ys) - 0.01 && center_y(f) + need/2 <= max(ys) + 0.01,
        Move_Pitch > 0 && len(chars(f)) > 0
        ? str(name, " characters and movement diagram run off the face. Move them with ", name,
              "_Center_Fraction, or raise Model Scale.")
        : str(name, " characters and movement diagram need ", need*Model_Scale, " mm of face length; the face has ",
              (max(ys) - min(ys))*Model_Scale, " mm. Raise Model Scale, or use fewer characters."));
    // Across the face too: Protect Face Edges would cut a wide diagram without a message.
    i = diagram_slot(f);
    size = diagram_size(f);
    at = [text_x(f) + glyph_x(f, i), center_y(f) + slot_y(f, i) + glyph_y(f, i)];
    corners_out = [for (dx = [-1, 1], dy = [-1, 1])
        if (!inside_convex(at + [dx*size[0]/2, dy*size[1]/2], face_polygon(safe_outline, f))) 1];
    assert(len(corners_out) == 0,
        str(name, " movement diagram is ", size[0]*Model_Scale, " mm wide and runs past the sides of the face.",
            " Raise Model Scale, lower Move Pitch, or move it with ", name, "_Center_Fraction."));
    // komascad.py and the tests read this line: the drawn pitch and size, then
    // the smallest printable ones, in final mm.
    echo("KOMASCAD_MOVES", name, pitch(f)*Model_Scale, diagram_size(f)*Model_Scale,
         min_pitch(f)*Model_Scale, min_diagram_size(f)*Model_Scale);
}

// Information in the Console.
echo(str("KomaSCAD ", version, ". Angles base / shoulder / point: ", base_angle, " / ", shoulder_angle, " / ",
         tip_angle, ". Tip thickness: ", tip_thickness*Model_Scale, " mm."));
for (f = [true, false]) if (slots(f) > 0)
    echo(str(f ? "Front" : "Back", " text size / spacing / center: ",
             font_size(f), " / ", char_spacing(f), " / ", center_y(f), " mm"));
if (Pawn_Circle)
    echo(str("Pawn Circle: outer diameter ", Base_Width/sin(9)*Model_Scale, " mm, inner diameter ",
             2*(pawn_circle_apothem - Piece_Length)*Model_Scale, " mm."));
// komascad.py reads these lines to name the materials and check the fonts.
if (Export_Metadata) {
    echo("KOMASCAD_FONTS", concat([for (f = [true, false]) if (active(f)) font(f)],
                                  signature_active() ? [signature_font()] : []));
    echo("KOMASCAD_EXPORT", [for (role = [0:3])
        [role_names[role], material_name(role), material_rgb(role), role == body_role || role_active(role)]]);
}


// ===== 10. Output =============================================================

module on_bed() {
    if (Print_Orientation == "Upright") translate([0, Rear_Thickness, 0]) rotate([90, 0, 0]) children();
    // Turn the piece over, make the front face level, and lift it onto the bed.
    else if (Print_Orientation == "Front face down")
        translate([0, 0, Rear_Thickness*cos(atan(front_slope))]) rotate([-atan(front_slope), 0, 0])
            rotate([0, 180, 0]) children();
    else if (Print_Orientation == "Back face down") rotate([-atan(back_slope), 0, 0]) children();
    else children();
}

printability_modes = [for (f = ["front", "back"], layer = ["ink", "thin", "gaps"]) str("Printability ", f, " ", layer)];
color_modes = ["Color body", "Color front", "Color back", "Color signature"];

if (!Export_Metadata) scale(Model_Scale) {
    if (Output_Mode == "Inspect front" || Output_Mode == "Inspect back") inspect_face(Output_Mode == "Inspect front");
    else if (Output_Mode == "Inspect printability") inspect_printability();
    else if (Output_Mode == "Inspect signature") inspect_signature();
    else if (Output_Mode == "Inspect pawn circle") inspect_pawn_circle();
    else if (in_list(Output_Mode, printability_modes)) {
        k = search([Output_Mode], printability_modes)[0];
        printability_layer(k < 3, ["ink", "thin", "gaps"][k%3]);
    }
    else on_bed() {
        if (Output_Mode == "Blank") color(material_rgb(body_role)) blank();
        else if (in_list(Output_Mode, color_modes)) {
            role = search([Output_Mode], color_modes)[0];   // the modes are in role order
            color(material_rgb(role)) render(convexity=30) if (role == body_role) body_part(); else color_part(role);
        }
        else if ($preview) print_preview();
        else color(material_rgb(body_role)) piece();
    }
}
